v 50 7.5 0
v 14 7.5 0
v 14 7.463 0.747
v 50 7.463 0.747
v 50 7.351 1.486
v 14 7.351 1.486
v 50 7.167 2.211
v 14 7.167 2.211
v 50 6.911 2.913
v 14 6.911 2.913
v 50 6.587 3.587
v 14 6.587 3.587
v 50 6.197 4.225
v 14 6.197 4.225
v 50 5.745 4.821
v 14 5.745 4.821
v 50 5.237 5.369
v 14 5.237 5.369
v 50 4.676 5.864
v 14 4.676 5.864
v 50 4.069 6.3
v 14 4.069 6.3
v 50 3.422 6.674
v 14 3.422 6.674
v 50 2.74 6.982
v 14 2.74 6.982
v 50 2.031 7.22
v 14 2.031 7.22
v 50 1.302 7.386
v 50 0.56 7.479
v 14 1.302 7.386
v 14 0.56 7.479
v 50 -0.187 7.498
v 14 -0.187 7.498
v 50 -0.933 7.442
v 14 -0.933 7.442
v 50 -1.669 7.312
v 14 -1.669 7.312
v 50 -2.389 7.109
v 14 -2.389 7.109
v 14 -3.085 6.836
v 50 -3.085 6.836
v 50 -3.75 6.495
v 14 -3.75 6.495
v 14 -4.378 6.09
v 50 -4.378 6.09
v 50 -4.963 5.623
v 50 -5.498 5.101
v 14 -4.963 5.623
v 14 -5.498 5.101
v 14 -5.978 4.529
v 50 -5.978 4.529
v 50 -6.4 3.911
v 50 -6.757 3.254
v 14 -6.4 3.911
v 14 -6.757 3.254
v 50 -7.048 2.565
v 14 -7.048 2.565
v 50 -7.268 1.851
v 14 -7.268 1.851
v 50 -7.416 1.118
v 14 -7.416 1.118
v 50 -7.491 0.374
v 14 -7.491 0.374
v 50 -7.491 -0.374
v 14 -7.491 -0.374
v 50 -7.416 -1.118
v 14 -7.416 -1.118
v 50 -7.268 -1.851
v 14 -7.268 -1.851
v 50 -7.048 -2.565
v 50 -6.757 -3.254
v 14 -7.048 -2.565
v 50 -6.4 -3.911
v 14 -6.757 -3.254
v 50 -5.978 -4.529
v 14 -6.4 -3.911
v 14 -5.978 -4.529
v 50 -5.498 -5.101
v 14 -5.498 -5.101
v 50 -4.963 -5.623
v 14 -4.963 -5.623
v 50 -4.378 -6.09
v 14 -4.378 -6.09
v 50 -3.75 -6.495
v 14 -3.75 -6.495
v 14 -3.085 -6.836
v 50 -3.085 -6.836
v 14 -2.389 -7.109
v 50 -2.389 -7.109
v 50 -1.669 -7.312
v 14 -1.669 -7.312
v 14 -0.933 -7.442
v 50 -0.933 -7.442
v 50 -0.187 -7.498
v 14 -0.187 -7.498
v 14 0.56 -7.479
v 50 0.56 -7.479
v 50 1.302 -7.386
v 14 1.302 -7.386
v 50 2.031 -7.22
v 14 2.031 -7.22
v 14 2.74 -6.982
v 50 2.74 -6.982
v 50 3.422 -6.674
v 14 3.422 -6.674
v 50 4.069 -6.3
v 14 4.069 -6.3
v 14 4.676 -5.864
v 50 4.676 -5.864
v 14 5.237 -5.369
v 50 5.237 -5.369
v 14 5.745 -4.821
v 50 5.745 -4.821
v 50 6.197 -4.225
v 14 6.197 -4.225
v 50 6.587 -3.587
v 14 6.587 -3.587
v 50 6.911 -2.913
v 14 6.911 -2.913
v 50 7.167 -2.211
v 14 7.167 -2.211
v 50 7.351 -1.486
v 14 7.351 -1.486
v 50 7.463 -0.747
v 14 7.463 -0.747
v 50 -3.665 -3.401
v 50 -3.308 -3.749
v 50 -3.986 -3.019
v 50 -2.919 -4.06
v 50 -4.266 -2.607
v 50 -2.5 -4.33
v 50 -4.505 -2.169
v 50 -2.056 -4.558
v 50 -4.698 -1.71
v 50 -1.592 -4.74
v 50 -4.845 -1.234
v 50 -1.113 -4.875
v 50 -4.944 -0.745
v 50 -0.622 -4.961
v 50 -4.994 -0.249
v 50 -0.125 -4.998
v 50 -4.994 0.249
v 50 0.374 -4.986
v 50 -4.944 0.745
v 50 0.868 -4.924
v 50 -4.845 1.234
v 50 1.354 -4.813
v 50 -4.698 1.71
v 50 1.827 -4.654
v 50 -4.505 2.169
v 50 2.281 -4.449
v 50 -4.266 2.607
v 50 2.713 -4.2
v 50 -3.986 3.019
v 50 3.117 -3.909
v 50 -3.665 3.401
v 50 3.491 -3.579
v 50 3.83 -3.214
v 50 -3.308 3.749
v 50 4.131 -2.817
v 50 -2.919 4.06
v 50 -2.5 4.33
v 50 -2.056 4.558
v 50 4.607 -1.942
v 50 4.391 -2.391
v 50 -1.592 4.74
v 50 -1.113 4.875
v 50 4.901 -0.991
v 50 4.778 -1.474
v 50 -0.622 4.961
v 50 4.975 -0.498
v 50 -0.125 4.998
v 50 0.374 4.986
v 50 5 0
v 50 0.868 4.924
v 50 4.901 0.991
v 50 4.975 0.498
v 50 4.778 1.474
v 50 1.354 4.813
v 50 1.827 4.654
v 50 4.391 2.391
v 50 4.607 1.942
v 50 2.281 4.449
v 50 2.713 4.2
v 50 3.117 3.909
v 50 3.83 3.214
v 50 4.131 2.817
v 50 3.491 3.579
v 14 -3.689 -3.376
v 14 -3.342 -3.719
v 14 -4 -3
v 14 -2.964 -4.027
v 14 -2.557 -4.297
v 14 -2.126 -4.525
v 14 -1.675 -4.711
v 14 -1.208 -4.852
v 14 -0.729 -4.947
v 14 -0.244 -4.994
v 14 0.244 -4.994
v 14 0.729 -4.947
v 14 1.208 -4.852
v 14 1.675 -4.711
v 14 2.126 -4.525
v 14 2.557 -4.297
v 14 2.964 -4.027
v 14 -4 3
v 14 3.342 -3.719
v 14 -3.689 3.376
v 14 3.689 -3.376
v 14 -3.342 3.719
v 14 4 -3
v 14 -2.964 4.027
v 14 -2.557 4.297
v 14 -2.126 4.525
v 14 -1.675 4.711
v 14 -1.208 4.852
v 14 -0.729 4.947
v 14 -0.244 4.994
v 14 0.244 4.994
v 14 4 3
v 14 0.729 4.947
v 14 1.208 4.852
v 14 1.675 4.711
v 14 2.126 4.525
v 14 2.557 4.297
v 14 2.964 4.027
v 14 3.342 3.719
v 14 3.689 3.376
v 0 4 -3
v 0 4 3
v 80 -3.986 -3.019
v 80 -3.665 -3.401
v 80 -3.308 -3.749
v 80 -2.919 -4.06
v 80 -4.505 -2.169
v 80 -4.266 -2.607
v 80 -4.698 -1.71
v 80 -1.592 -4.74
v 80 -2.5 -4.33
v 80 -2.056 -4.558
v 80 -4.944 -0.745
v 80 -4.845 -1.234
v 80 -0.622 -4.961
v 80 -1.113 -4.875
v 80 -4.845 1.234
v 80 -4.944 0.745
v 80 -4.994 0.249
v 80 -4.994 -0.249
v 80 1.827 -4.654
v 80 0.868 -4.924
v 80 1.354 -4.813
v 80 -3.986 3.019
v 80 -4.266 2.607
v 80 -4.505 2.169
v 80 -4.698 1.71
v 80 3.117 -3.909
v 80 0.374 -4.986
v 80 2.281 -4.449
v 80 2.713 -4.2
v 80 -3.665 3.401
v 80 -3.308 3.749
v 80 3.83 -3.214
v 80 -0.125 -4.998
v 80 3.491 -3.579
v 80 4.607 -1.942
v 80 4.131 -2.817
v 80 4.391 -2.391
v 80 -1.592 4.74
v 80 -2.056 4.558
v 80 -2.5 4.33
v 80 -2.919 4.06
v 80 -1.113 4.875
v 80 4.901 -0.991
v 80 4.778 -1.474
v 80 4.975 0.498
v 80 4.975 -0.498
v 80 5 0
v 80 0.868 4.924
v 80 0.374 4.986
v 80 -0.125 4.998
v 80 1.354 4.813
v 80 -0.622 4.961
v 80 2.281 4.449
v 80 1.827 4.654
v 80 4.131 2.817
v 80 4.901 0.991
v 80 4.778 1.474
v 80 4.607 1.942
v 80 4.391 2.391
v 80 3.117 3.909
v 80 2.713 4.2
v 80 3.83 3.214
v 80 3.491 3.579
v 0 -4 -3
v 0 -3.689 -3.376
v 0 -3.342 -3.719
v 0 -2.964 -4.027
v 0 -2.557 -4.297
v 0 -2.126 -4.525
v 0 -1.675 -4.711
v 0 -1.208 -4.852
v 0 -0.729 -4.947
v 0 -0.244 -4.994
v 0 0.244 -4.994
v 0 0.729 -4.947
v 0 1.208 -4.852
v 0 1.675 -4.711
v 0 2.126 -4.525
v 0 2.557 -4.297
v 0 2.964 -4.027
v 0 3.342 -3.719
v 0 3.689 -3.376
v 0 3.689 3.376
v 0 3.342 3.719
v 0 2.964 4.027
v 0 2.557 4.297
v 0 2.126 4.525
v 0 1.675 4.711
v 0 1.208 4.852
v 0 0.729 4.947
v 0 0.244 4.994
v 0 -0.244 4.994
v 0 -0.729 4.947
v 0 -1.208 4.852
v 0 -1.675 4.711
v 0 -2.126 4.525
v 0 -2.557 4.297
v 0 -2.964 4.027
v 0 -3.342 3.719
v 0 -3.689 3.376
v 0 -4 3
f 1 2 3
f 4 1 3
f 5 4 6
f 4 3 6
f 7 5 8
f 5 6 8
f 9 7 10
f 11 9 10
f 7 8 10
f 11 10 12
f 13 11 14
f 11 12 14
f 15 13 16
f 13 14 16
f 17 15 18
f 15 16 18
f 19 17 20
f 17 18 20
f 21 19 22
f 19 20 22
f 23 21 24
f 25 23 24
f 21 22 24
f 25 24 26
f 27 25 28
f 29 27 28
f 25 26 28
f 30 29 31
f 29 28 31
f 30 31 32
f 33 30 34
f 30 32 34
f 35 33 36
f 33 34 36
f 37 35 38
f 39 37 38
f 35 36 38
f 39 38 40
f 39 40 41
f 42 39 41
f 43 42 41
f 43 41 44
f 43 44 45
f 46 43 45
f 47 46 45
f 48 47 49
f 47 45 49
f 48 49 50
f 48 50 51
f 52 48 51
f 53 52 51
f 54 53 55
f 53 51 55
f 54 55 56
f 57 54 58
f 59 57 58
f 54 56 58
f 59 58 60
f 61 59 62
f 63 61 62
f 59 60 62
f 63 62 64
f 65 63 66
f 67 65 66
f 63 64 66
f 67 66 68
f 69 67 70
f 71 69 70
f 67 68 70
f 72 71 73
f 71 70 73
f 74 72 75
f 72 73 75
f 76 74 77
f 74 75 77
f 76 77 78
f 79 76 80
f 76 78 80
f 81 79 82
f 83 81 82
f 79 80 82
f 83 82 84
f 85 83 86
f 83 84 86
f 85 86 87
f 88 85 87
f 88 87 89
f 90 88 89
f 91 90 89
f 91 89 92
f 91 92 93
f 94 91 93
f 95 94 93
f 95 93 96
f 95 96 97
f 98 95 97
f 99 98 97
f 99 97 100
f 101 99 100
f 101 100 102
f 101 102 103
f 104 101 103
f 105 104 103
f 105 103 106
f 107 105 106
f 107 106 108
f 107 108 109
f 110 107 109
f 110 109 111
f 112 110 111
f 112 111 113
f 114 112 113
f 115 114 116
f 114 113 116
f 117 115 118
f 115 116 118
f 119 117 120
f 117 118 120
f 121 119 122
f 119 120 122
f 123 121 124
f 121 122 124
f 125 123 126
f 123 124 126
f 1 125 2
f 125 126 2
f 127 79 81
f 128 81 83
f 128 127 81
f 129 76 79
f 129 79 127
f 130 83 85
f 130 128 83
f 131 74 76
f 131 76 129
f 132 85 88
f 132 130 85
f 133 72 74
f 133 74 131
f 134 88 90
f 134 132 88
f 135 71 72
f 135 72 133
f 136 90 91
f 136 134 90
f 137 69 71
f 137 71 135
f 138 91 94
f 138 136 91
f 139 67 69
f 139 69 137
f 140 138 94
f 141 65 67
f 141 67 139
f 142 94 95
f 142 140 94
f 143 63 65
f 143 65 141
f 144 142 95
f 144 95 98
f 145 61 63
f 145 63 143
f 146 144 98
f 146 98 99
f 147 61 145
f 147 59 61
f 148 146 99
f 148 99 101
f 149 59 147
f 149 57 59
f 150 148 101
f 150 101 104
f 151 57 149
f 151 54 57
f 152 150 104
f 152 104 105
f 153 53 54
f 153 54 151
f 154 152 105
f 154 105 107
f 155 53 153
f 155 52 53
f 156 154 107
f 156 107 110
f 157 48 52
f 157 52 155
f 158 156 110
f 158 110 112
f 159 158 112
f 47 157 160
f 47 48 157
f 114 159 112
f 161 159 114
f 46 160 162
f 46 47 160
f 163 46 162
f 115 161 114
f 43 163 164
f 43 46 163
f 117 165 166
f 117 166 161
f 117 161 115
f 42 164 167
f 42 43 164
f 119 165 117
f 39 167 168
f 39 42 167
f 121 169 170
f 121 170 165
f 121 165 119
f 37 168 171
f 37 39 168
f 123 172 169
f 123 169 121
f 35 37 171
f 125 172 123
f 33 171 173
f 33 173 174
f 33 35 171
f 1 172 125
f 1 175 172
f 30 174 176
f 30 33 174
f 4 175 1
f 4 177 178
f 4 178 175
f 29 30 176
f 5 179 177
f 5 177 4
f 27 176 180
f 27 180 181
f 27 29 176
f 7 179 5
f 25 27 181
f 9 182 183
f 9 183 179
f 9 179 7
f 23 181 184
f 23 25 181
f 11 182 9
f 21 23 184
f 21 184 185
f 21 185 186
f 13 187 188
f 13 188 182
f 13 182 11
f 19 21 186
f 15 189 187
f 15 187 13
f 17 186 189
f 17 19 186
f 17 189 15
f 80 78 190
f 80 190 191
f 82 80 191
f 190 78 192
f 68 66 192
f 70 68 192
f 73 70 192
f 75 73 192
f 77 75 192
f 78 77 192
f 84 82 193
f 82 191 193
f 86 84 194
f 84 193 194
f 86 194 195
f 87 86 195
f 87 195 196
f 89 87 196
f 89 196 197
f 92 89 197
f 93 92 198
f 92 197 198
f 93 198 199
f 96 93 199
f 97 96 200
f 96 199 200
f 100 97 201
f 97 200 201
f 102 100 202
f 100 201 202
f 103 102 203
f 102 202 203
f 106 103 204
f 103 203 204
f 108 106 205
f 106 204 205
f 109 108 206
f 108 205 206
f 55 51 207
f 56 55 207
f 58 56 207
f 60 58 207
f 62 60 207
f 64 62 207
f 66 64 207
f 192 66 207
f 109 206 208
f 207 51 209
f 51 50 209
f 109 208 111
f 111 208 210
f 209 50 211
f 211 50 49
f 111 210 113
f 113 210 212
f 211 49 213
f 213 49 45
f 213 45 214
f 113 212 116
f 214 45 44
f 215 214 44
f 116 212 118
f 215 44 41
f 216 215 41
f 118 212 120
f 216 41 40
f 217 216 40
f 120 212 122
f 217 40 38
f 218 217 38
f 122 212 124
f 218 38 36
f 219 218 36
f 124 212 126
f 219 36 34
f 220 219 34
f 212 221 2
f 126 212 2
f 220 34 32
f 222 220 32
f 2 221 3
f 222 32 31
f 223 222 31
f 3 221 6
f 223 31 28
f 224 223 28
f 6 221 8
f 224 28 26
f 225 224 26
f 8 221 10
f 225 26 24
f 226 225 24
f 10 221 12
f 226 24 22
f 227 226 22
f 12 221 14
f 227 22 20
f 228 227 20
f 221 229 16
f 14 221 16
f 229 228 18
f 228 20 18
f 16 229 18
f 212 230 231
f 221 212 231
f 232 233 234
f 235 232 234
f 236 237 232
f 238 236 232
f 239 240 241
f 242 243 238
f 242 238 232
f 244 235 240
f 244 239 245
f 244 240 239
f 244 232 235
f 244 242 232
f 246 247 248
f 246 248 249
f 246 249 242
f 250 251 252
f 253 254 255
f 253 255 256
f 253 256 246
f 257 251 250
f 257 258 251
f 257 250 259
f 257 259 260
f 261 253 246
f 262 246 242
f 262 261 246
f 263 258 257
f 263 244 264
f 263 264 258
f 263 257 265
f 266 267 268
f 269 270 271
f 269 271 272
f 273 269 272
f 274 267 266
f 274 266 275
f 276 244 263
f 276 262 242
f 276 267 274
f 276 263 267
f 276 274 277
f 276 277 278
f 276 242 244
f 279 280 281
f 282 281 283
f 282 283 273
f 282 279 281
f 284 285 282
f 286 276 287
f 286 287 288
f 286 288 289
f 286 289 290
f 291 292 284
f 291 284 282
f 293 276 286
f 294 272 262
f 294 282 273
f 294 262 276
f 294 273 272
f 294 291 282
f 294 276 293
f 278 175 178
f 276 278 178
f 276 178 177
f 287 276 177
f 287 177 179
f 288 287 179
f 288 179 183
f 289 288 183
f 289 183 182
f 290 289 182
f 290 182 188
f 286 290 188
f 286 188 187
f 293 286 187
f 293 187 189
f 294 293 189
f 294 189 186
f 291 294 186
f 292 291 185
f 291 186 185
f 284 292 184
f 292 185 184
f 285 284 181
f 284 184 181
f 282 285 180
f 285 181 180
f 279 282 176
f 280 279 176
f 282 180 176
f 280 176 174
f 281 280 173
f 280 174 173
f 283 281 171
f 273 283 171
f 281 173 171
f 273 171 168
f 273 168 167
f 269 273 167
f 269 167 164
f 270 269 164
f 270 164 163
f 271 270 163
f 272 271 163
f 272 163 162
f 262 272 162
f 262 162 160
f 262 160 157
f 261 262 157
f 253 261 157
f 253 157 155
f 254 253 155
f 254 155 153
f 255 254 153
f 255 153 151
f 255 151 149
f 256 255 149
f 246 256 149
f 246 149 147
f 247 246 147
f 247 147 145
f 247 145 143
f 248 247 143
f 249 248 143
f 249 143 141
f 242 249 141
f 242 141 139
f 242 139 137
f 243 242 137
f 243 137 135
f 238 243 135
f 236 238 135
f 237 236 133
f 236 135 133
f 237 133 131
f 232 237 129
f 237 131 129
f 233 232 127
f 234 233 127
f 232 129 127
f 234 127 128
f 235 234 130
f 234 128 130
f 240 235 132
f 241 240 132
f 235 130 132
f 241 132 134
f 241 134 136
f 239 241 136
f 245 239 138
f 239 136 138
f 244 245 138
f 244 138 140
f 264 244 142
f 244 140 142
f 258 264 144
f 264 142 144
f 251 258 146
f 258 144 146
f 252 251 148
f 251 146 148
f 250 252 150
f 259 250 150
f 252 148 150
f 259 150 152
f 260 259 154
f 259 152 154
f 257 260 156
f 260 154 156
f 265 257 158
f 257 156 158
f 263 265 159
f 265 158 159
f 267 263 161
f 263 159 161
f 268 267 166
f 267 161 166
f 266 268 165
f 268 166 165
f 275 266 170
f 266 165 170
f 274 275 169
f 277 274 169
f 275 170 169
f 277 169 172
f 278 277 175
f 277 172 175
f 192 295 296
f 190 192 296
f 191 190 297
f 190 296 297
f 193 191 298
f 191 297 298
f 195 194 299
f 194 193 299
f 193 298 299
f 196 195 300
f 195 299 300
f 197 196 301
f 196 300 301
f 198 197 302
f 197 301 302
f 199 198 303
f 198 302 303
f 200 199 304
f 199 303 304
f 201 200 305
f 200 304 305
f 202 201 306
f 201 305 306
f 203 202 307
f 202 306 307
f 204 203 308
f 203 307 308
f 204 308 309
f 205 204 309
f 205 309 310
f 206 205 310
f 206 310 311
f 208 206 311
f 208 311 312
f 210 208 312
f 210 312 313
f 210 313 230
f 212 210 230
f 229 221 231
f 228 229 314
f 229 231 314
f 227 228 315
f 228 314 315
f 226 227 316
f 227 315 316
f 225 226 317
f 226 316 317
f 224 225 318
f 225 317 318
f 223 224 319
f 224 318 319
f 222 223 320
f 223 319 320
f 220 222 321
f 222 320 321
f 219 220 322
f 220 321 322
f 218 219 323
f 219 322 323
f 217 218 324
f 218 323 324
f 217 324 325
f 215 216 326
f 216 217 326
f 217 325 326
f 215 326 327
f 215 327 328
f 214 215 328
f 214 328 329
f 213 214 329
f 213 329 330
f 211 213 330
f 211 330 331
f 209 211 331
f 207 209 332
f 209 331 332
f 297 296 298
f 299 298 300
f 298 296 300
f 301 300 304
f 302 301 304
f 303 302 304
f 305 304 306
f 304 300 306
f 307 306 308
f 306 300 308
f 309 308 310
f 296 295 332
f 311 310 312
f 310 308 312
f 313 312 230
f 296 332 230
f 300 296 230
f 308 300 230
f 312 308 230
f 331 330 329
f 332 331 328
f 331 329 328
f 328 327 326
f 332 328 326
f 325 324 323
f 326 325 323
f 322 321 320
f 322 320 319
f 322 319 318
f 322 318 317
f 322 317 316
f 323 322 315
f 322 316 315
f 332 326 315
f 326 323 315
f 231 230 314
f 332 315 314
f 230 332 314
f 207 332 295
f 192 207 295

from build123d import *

# Parameters (mm, degrees)
F0_R     = 5
F1_DEPTH = 80
F3_R     = 7.5
F4_DEPTH = 36
F6_DEPTH = 14


with BuildPart() as f1:
    # F0 (on Right) → F1 (new body)
    with BuildSketch(Plane.YZ):
        Circle(F0_R)
    extrude(amount=F1_DEPTH)

    # F3 (on offset) → F4 (join)
    with BuildSketch(Plane.YZ.offset(14)):
        Circle(F3_R)
    extrude(amount=F4_DEPTH)

    # F5 (on face) → F6 (cut, through all)
    with BuildSketch(Plane(origin=(0, 0, 0), x_dir=(0, -1, 0), z_dir=(-1, 0, 0))):
        with BuildLine():
            Line((-4, -3), (-4, 3))
            ThreePointArc((-4, 3), (-5, 0), (-4, -3))
        make_face()
        with BuildLine():
            ThreePointArc((4, -3), (5, 0), (4, 3))
            Line((4, 3), (4, -3))
        make_face()
    extrude(amount=-F6_DEPTH, mode=Mode.SUBTRACT)


solid = f1.part
